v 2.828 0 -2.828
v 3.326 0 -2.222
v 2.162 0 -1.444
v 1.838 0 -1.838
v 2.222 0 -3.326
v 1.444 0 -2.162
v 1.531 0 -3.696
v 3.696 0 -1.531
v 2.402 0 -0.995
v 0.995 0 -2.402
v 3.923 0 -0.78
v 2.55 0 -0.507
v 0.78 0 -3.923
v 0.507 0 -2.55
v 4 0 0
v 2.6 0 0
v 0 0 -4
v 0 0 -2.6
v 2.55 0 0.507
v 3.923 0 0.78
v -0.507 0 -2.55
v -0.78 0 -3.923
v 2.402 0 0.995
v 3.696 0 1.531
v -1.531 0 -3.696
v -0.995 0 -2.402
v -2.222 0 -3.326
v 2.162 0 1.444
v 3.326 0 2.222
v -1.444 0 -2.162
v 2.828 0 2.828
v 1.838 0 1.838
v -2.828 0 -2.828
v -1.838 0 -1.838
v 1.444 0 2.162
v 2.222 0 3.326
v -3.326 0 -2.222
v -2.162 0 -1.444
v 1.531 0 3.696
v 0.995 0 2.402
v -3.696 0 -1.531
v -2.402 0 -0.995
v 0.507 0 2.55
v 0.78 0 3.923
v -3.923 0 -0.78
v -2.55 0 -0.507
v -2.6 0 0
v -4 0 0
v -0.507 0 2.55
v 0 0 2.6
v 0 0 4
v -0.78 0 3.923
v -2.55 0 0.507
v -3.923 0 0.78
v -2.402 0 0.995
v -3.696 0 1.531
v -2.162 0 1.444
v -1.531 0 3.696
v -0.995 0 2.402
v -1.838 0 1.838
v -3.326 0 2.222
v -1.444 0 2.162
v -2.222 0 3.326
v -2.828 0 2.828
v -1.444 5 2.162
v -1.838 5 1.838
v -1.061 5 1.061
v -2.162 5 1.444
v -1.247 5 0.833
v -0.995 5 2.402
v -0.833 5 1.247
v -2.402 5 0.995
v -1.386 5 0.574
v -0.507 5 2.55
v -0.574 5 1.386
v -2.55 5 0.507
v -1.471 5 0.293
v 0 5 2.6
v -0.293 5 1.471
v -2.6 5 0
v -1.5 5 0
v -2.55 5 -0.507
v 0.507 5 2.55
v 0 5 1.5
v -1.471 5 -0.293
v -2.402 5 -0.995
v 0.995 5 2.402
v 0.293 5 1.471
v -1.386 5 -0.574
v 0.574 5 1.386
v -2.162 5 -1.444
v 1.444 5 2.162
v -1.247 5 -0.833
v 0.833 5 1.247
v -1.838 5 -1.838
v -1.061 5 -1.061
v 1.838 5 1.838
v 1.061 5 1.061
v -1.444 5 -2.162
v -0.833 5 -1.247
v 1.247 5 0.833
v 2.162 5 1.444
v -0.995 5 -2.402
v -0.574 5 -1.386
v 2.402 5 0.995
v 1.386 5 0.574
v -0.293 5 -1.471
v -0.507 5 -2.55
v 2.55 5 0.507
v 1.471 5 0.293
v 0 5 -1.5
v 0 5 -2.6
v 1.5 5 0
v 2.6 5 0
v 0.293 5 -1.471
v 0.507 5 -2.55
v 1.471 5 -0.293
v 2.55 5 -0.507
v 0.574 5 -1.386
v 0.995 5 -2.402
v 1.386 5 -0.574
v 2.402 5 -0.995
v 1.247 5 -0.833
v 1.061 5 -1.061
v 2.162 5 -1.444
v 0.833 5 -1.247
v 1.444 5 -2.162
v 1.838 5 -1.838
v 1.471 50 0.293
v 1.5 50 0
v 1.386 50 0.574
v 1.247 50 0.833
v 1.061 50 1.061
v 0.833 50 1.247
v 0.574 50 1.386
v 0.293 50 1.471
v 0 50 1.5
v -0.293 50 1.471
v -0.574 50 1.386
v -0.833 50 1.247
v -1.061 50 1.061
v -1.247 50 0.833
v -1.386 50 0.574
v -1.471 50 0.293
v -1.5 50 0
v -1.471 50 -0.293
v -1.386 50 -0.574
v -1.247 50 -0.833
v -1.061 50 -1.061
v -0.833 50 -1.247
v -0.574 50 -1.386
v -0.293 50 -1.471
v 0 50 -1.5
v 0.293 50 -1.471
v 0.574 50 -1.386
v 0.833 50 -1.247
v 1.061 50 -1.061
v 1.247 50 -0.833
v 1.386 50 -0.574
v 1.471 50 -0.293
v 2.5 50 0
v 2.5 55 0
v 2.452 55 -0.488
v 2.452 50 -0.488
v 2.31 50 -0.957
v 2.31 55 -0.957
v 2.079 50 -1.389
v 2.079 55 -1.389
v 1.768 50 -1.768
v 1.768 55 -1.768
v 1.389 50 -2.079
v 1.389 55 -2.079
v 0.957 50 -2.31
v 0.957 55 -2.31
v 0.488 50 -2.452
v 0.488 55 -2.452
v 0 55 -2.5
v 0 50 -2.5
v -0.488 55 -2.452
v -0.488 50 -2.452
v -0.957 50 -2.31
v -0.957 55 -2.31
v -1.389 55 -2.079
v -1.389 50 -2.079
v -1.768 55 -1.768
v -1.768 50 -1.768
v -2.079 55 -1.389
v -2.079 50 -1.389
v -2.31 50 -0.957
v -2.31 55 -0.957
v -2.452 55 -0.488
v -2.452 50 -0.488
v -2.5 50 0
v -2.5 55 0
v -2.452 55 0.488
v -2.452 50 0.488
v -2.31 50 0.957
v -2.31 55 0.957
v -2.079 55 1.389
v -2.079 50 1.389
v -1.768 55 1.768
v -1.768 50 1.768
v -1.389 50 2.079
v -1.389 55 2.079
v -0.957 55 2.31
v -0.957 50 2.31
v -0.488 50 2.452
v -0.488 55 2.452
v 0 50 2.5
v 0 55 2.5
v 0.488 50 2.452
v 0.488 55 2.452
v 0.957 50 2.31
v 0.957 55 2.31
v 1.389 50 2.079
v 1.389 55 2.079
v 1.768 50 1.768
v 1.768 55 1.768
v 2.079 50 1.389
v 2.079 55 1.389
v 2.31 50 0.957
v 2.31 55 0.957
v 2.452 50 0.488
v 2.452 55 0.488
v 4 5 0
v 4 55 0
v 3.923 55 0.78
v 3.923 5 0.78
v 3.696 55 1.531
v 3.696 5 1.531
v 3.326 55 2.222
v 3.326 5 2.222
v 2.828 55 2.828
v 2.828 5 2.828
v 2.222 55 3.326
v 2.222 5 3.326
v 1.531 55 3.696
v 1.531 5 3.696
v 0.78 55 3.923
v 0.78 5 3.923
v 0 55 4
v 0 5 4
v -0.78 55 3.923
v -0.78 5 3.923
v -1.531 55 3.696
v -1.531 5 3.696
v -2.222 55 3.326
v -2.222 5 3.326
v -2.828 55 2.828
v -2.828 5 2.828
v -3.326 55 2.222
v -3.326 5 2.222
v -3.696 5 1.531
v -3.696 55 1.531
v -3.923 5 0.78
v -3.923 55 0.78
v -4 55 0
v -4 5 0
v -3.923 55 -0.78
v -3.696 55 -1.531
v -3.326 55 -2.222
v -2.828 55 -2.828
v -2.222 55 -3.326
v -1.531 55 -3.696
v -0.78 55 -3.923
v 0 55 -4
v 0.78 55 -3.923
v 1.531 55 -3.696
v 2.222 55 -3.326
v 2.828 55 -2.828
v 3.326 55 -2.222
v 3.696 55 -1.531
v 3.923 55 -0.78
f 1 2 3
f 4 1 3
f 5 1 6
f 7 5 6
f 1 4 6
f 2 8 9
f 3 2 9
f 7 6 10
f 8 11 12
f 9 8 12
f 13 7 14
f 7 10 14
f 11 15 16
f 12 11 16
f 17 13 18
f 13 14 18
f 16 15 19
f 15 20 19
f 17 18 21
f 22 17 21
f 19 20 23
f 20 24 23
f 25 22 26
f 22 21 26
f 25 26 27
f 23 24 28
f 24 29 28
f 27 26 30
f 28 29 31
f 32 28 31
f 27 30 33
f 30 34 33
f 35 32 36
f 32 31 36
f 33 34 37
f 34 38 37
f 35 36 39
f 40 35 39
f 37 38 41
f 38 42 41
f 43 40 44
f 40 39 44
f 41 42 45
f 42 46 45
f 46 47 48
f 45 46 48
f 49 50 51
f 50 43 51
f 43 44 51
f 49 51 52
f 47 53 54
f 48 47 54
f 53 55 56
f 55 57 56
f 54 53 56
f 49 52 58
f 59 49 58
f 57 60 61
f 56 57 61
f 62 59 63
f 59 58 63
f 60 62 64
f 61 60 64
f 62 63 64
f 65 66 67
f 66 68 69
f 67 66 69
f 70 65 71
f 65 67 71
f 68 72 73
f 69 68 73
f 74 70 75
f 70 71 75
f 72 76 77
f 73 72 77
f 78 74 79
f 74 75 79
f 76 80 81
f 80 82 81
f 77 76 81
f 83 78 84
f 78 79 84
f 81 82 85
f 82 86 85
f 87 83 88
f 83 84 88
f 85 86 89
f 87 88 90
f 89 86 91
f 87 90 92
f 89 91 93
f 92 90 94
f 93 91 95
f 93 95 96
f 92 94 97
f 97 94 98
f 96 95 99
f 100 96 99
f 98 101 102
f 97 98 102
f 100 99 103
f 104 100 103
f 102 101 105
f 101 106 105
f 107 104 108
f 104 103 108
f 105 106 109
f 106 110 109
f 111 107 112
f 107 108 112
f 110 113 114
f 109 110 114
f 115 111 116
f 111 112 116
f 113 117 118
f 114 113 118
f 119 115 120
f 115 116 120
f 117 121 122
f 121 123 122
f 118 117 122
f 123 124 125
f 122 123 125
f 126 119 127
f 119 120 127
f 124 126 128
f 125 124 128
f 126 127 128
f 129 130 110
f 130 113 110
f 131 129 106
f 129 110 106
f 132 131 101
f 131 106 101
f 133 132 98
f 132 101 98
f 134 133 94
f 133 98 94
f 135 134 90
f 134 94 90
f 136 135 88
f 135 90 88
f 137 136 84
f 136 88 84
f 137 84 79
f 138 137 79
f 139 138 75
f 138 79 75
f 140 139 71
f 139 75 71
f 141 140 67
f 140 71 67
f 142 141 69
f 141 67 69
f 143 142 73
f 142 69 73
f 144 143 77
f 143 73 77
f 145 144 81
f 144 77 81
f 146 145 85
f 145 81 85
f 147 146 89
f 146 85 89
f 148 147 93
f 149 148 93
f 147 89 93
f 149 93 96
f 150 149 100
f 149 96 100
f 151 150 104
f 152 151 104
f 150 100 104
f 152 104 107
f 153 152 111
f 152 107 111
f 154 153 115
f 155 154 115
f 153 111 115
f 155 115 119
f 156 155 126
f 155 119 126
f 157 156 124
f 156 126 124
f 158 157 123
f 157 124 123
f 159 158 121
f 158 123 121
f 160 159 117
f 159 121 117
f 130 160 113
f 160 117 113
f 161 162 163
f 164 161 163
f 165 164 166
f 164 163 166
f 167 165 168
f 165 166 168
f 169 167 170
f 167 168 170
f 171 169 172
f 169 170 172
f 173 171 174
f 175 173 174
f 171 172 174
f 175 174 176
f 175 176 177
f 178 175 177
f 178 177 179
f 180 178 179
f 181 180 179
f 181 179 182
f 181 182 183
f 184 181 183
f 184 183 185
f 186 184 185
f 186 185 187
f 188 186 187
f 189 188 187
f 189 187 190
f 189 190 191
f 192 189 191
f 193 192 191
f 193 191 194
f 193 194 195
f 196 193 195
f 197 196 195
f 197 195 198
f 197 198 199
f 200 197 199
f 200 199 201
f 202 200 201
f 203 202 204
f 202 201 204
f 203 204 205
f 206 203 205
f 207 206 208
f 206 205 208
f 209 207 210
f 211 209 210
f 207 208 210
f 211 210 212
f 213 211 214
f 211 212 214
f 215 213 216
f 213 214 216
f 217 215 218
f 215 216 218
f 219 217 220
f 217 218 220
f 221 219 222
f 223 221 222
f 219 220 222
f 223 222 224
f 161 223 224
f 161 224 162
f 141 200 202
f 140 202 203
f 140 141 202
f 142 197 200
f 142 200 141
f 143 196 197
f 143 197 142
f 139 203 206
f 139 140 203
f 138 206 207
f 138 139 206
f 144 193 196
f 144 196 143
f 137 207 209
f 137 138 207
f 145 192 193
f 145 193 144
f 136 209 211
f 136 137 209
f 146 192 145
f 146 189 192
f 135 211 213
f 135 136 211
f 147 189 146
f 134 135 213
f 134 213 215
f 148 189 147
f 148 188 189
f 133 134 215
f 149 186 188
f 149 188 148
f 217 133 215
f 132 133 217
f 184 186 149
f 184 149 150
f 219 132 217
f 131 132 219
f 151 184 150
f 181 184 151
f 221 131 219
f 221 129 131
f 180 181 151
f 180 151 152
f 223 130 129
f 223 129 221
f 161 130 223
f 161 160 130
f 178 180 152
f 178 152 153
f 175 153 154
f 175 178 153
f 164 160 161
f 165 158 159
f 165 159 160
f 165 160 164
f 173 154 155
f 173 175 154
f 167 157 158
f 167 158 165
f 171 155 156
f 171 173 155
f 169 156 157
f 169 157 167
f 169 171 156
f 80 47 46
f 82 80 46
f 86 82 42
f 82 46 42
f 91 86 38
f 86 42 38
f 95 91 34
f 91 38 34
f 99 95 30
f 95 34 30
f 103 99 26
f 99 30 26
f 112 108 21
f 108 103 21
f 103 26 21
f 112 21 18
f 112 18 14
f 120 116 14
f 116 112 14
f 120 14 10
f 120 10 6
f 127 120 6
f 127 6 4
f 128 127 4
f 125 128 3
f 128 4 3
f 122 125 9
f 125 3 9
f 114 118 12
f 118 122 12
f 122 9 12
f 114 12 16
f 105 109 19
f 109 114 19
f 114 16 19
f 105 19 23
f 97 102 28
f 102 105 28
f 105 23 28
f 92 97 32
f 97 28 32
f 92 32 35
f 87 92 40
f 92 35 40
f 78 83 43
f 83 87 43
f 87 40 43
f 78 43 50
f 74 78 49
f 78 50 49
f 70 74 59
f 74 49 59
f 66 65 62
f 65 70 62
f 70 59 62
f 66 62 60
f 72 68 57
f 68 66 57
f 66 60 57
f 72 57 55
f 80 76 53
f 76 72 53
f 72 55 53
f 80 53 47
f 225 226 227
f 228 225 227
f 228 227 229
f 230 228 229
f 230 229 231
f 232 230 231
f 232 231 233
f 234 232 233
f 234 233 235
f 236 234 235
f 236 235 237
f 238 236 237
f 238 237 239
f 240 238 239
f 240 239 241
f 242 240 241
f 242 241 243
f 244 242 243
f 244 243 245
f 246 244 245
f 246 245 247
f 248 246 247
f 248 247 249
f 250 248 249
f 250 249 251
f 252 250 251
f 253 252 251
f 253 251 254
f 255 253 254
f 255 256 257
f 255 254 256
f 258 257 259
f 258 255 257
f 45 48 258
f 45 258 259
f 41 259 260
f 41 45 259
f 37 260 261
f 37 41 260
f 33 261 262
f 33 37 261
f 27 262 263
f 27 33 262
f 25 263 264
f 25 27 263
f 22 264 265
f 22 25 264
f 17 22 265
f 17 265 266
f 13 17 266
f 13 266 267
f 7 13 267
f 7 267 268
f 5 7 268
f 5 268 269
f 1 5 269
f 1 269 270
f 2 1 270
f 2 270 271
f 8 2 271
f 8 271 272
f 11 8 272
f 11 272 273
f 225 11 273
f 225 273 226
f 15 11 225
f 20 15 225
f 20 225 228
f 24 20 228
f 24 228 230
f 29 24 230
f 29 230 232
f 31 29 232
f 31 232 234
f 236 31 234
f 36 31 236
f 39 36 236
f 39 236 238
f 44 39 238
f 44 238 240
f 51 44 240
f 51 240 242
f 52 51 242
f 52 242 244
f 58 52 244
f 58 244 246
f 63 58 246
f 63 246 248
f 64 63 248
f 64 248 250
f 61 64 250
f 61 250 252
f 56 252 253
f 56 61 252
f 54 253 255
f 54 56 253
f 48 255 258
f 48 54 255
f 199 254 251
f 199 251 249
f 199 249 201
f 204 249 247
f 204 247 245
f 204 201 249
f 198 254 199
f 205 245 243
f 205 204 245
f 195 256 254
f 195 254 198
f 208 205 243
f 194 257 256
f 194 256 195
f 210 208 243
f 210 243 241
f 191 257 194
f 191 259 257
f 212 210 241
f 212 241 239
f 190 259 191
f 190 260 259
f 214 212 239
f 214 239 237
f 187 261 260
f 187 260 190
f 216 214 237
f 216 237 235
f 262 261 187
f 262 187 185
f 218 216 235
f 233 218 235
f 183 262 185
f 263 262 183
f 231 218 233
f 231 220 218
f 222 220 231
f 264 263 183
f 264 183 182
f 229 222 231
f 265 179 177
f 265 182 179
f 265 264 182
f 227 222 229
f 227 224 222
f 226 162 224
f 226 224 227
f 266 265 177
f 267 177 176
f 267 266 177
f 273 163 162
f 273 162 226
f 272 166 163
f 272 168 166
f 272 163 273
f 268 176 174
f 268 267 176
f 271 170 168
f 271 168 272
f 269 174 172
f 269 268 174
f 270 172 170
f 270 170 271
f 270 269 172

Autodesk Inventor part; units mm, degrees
ref_plane "YZ Plane" through (0, 0, 0) normal (1, 0, 0) x (0, 1, 0)
ref_plane "XZ Plane" through (0, 0, 0) normal (0, 1, 0) x (-1, 0, 0)
ref_plane "XY Plane" through (0, 0, 0) normal (0, 0, 1) x (1, 0, 0)
sketch "Sketch1" plane through (0, 0, 0) normal (0, 1, 0) x (-1, 0, 0)
  circle A0 centre (0, 0) radius 4
  circle A1 centre (0, 0) radius 2.6
  dimension "d0" = 8
  dimension "d1" = 5.2
extrude "Extrusion1" add sketch "Sketch1" along normal blind 5
sketch "Sketch2" plane through (0, 5, 0) normal (0, 1, 0) x (1, 0, 0)
  circle A0 centre (0, 0) radius 4 projected
  circle A1 centre (0, 0) radius 1.5
  circle A2 centre (0, 0) radius 4
  dimension "d4" = 3
  dimension "d5" = 8
extrude "Extrusion2" add sketch "Sketch2" along normal blind 50
sketch "Sketch3" plane through (0, 55, 0) normal (0, 1, 0) x (1, 0, 0)
  circle A0 centre (0, 0) radius 2.5
  dimension "d8" = 5
extrude "Extrusion3" cut sketch "Sketch3" against normal blind 5
properties part number "MountScrew_test"
